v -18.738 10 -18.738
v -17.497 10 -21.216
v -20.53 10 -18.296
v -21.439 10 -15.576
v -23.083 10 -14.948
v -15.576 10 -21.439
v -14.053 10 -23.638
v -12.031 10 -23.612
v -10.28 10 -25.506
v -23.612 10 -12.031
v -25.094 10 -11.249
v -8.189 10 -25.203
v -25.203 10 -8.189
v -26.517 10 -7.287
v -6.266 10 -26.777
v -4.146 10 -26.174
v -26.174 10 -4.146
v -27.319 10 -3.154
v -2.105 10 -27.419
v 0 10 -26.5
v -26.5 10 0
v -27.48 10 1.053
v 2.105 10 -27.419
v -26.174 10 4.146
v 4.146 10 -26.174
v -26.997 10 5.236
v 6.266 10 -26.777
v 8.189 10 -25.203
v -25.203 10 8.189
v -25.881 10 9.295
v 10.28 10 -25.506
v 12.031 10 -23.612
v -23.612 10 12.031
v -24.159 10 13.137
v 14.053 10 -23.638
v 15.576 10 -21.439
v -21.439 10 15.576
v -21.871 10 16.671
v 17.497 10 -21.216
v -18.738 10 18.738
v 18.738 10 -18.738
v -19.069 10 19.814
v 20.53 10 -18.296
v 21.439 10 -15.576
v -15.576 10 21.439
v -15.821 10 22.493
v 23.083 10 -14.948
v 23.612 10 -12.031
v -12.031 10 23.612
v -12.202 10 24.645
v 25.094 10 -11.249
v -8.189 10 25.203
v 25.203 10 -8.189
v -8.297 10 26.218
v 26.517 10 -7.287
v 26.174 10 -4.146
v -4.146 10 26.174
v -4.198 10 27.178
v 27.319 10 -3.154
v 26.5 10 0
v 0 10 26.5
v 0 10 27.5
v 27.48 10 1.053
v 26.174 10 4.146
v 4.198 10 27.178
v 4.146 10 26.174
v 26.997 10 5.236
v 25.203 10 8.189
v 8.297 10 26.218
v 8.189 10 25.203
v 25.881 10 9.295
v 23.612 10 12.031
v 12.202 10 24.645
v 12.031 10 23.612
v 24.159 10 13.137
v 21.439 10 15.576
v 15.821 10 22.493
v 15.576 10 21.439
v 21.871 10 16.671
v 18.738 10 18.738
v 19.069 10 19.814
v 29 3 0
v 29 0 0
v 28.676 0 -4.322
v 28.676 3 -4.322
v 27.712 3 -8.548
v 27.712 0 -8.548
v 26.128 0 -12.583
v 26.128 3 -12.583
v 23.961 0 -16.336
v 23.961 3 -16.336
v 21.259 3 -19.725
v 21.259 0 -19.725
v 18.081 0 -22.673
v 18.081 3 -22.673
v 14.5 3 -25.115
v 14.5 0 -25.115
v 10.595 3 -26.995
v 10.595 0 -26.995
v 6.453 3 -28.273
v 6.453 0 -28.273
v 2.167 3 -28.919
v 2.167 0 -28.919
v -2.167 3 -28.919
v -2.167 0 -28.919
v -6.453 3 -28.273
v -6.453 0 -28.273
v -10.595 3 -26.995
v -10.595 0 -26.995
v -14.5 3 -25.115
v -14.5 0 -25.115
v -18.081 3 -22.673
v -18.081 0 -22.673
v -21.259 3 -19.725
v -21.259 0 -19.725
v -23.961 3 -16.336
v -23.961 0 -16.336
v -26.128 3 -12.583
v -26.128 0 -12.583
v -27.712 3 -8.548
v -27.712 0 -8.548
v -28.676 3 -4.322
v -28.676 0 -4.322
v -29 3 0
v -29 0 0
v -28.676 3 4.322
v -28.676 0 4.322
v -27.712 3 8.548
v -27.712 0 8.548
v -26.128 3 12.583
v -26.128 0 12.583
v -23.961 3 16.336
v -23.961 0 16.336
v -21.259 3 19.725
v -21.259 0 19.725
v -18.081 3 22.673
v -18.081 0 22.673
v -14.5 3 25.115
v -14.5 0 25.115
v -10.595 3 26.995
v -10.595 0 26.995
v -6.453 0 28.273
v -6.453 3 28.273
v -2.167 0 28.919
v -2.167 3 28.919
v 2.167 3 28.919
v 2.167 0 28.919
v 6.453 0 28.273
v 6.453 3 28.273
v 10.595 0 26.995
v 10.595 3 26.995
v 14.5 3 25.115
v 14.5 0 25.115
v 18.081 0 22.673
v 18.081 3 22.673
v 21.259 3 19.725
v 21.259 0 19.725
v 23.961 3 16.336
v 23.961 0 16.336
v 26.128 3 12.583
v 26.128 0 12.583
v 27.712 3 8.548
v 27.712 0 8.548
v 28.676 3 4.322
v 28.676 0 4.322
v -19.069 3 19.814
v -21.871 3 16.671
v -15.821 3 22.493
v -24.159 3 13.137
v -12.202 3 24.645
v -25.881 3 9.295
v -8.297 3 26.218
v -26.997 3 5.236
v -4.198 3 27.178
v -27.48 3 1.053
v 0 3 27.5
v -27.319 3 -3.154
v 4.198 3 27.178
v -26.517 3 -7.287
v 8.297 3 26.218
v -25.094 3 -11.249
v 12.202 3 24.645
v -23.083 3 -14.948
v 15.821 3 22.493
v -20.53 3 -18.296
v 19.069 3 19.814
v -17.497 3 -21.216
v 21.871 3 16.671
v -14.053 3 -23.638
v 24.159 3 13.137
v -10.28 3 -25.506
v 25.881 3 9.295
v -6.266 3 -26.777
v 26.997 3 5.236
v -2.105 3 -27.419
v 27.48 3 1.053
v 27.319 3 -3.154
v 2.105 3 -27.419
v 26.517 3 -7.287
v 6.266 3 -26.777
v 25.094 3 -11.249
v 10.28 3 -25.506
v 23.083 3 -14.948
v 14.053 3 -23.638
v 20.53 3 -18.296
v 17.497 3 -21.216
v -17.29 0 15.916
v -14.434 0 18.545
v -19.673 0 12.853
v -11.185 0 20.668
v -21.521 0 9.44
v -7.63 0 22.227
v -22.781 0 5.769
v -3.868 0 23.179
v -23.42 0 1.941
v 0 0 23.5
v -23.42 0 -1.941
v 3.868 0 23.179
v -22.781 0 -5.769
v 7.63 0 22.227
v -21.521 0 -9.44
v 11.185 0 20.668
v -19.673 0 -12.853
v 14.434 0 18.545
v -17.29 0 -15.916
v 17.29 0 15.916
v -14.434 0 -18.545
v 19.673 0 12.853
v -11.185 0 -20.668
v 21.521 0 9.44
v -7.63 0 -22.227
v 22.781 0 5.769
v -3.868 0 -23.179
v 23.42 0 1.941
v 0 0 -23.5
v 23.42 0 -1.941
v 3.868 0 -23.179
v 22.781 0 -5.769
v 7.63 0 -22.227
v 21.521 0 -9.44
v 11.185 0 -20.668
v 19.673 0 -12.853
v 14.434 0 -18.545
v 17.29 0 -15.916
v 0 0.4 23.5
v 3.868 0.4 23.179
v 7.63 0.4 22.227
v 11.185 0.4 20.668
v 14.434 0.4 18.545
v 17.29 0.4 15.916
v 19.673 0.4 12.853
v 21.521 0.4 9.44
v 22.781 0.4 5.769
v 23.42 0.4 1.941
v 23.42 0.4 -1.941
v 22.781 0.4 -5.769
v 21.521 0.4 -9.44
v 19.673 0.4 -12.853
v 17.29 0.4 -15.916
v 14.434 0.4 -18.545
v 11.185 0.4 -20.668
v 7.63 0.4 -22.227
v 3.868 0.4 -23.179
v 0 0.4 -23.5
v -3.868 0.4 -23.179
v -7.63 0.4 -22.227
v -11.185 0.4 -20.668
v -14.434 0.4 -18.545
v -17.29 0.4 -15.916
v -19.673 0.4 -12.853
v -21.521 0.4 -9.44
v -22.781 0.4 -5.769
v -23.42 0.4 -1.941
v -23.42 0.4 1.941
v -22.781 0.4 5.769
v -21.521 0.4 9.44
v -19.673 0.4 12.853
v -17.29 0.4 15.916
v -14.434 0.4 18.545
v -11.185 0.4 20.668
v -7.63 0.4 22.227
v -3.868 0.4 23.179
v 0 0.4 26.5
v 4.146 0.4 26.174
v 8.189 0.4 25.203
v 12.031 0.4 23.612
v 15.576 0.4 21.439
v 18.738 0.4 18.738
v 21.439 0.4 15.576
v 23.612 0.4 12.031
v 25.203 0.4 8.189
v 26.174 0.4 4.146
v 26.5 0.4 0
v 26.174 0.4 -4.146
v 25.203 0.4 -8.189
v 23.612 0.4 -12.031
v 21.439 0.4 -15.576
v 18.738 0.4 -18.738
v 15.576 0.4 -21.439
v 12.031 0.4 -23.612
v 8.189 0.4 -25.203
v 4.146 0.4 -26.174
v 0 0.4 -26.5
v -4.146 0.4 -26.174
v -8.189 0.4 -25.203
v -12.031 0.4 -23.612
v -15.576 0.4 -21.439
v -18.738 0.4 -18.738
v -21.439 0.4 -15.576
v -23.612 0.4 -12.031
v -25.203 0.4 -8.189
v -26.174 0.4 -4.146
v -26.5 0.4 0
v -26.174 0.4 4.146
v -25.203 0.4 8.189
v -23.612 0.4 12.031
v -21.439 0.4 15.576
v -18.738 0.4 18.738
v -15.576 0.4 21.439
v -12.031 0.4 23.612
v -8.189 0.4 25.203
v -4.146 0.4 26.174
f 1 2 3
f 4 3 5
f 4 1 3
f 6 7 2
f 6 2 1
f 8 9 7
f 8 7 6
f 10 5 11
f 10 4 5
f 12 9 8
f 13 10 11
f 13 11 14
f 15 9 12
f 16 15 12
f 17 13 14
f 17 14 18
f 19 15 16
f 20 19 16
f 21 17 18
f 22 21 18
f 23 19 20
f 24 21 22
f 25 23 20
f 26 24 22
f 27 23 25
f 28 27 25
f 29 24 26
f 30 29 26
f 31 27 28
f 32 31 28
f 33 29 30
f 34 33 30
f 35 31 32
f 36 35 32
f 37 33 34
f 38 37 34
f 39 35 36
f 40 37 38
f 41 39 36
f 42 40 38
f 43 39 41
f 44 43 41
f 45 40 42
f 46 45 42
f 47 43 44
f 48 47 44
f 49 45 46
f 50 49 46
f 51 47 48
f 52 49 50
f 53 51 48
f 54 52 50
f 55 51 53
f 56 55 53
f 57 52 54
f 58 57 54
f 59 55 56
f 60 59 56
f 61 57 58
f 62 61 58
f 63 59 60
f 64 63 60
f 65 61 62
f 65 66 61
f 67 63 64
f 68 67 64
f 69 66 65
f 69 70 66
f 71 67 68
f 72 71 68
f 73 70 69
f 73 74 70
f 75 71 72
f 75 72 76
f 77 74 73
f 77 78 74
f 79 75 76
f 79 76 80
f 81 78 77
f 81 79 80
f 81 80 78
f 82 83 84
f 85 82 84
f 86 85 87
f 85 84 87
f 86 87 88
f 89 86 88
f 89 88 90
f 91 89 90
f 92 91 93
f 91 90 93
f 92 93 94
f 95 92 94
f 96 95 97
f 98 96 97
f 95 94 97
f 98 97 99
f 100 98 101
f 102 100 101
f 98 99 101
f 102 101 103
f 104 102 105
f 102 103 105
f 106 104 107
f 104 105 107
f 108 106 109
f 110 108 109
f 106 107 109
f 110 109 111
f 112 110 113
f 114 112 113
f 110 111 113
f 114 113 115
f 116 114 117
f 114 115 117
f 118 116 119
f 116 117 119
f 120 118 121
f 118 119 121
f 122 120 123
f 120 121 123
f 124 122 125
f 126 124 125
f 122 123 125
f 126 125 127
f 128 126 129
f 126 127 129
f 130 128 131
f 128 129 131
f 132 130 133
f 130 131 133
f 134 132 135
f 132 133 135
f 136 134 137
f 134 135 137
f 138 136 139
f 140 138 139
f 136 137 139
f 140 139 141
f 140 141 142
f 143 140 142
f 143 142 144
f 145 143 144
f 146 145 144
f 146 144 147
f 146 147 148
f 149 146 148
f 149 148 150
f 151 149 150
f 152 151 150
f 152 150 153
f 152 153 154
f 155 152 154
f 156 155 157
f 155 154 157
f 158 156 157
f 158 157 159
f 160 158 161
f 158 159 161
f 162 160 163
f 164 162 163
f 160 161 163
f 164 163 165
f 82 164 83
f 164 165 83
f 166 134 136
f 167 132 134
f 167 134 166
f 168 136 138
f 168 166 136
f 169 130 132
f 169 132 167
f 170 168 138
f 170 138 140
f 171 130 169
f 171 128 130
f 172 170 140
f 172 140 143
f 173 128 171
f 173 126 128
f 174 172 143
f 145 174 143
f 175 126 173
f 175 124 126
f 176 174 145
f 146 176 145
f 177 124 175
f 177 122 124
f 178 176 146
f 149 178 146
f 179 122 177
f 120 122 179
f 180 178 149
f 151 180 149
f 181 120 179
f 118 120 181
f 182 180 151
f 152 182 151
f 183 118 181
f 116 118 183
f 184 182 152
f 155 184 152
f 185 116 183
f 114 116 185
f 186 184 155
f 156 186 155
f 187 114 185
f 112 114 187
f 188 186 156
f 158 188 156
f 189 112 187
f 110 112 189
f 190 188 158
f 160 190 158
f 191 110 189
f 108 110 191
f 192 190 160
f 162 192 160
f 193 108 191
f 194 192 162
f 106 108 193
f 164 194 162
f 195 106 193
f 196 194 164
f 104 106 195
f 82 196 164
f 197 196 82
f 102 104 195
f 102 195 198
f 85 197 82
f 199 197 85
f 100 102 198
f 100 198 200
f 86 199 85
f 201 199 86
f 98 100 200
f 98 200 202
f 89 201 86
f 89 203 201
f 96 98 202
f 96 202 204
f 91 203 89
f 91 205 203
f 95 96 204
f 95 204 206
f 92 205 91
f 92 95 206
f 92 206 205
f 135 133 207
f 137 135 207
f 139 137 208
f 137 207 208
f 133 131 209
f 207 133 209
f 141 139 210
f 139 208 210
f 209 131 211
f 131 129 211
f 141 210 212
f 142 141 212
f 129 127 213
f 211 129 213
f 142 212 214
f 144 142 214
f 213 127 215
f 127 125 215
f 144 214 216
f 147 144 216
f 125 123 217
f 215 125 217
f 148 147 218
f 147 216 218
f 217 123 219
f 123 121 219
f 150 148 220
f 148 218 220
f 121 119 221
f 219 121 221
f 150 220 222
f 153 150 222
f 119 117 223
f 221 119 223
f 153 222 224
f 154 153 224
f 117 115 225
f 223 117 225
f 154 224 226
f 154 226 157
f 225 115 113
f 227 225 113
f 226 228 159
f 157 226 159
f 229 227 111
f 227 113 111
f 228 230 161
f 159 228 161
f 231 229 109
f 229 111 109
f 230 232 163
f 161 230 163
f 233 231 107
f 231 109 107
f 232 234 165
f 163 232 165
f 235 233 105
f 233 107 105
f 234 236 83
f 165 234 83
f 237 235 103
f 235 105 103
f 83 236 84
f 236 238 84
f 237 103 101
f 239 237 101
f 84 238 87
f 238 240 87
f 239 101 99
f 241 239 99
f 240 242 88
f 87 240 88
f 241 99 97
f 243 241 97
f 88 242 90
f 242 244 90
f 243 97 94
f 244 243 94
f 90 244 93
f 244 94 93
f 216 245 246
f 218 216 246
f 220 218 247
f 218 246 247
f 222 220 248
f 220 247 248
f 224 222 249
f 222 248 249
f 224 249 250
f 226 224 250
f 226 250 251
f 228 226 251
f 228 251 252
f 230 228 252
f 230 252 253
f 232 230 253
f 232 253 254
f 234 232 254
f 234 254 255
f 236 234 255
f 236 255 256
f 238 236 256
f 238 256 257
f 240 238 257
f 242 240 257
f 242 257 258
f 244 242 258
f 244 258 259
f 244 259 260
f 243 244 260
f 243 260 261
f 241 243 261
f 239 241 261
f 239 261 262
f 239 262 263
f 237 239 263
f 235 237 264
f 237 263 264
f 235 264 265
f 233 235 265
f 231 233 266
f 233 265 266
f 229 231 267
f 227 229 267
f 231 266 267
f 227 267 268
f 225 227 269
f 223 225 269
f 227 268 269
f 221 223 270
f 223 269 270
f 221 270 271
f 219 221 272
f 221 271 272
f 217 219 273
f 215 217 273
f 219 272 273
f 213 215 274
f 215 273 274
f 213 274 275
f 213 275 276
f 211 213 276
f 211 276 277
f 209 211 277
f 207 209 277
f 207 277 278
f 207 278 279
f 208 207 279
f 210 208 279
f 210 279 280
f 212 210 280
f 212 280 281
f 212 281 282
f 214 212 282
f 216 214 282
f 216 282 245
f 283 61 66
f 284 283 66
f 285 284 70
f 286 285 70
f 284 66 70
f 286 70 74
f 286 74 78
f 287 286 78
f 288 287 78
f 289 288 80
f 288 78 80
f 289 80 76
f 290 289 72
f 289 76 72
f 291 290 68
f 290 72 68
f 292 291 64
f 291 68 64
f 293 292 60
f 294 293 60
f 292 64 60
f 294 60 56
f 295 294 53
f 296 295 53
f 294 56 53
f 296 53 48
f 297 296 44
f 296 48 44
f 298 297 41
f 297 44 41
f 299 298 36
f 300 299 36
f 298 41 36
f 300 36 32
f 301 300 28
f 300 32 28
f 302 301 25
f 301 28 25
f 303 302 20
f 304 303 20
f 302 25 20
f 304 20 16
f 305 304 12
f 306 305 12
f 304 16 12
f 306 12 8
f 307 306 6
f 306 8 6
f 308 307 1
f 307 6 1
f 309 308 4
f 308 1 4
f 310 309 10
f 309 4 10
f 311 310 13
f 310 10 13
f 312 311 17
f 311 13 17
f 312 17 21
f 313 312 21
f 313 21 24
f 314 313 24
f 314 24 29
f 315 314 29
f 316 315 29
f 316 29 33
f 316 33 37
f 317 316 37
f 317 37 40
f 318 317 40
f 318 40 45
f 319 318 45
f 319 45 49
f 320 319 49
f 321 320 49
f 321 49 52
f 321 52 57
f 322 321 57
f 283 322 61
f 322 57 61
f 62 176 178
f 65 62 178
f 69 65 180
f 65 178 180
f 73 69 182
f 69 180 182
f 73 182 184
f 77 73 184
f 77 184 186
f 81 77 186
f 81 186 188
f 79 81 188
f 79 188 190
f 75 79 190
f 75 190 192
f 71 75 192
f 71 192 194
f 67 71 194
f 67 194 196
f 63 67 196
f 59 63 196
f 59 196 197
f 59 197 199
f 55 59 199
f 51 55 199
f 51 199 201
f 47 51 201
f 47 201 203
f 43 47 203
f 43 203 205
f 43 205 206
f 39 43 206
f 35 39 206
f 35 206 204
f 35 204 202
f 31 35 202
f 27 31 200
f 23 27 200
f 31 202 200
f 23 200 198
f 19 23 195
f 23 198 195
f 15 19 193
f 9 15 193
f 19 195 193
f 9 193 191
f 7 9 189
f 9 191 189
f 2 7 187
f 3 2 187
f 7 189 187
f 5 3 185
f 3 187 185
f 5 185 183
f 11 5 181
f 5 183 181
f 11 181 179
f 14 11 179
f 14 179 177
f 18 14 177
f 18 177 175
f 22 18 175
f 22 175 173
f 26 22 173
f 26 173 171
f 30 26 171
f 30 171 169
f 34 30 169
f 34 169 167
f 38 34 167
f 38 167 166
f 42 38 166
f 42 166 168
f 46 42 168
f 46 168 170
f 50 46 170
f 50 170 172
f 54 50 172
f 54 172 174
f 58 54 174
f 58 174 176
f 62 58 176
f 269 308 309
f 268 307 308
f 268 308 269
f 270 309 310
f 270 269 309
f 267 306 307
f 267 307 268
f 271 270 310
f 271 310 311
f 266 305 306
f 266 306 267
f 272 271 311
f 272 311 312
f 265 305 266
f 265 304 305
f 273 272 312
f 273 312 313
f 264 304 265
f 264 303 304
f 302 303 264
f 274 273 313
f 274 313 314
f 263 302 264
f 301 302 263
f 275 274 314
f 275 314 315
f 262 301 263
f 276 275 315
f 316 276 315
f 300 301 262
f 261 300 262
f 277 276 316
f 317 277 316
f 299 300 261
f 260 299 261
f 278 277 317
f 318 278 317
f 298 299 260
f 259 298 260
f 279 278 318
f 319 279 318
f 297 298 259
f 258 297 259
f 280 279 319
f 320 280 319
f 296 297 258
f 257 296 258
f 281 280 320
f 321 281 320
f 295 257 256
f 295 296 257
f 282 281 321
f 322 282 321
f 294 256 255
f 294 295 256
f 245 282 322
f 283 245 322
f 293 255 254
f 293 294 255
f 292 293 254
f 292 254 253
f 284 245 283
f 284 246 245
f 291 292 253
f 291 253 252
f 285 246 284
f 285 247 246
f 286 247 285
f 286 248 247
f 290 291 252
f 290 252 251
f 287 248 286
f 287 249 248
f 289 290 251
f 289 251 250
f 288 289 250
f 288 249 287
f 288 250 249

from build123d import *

# Parameters (mm, degrees)
SKETCH1_R           = 27.5
BOSS_EXTRUDE1_DEPTH = 10
SKETCH2_R           = 29
SKETCH2_R_2         = 24
EXTRUDE_THIN1_DEPTH = 3
SKETCH3_R           = 26.5
CUT_EXTRUDE1_DEPTH  = 9.6
SKETCH4_R           = 23.5
CUT_EXTRUDE2_DEPTH  = 43.12077872


with BuildPart() as part:
    # Sketch1 → Boss-Extrude1 (new body)
    with BuildSketch(Plane(origin=(0, 0, 0), x_dir=(1, 0, 0), z_dir=(0, 1, 0))):
        with Locations(Location((0, 0, 0), (0, 0, 270))):
            Circle(SKETCH1_R)
    extrude(amount=BOSS_EXTRUDE1_DEPTH)

    # Sketch2 → Extrude-Thin1 (add)
    with BuildSketch(Plane(origin=(0, 0, 0), x_dir=(1, 0, 0), z_dir=(0, 1, 0))):
        Circle(SKETCH2_R)
        Circle(SKETCH2_R_2, mode=Mode.SUBTRACT)
    extrude(amount=EXTRUDE_THIN1_DEPTH)

    # Sketch3 → Cut-Extrude1 (cut)
    with BuildSketch(Plane(origin=(0, 10, 0), x_dir=(1, 0, 0), z_dir=(0, 1, 0))):
        with Locations(Location((0, 0, 0), (0, 0, 270))):
            Circle(SKETCH3_R)
    extrude(amount=-CUT_EXTRUDE1_DEPTH, mode=Mode.SUBTRACT)

    # Sketch4 → Cut-Extrude2 (cut, through all)
    with BuildSketch(Plane(origin=(0, 0.4, 0), x_dir=(1, 0, 0), z_dir=(0, 1, 0))):
        with Locations(Location((0, 0, 0), (0, 0, 270))):
            Circle(SKETCH4_R)
    extrude(amount=-CUT_EXTRUDE2_DEPTH, mode=Mode.SUBTRACT)


solid = part.part
